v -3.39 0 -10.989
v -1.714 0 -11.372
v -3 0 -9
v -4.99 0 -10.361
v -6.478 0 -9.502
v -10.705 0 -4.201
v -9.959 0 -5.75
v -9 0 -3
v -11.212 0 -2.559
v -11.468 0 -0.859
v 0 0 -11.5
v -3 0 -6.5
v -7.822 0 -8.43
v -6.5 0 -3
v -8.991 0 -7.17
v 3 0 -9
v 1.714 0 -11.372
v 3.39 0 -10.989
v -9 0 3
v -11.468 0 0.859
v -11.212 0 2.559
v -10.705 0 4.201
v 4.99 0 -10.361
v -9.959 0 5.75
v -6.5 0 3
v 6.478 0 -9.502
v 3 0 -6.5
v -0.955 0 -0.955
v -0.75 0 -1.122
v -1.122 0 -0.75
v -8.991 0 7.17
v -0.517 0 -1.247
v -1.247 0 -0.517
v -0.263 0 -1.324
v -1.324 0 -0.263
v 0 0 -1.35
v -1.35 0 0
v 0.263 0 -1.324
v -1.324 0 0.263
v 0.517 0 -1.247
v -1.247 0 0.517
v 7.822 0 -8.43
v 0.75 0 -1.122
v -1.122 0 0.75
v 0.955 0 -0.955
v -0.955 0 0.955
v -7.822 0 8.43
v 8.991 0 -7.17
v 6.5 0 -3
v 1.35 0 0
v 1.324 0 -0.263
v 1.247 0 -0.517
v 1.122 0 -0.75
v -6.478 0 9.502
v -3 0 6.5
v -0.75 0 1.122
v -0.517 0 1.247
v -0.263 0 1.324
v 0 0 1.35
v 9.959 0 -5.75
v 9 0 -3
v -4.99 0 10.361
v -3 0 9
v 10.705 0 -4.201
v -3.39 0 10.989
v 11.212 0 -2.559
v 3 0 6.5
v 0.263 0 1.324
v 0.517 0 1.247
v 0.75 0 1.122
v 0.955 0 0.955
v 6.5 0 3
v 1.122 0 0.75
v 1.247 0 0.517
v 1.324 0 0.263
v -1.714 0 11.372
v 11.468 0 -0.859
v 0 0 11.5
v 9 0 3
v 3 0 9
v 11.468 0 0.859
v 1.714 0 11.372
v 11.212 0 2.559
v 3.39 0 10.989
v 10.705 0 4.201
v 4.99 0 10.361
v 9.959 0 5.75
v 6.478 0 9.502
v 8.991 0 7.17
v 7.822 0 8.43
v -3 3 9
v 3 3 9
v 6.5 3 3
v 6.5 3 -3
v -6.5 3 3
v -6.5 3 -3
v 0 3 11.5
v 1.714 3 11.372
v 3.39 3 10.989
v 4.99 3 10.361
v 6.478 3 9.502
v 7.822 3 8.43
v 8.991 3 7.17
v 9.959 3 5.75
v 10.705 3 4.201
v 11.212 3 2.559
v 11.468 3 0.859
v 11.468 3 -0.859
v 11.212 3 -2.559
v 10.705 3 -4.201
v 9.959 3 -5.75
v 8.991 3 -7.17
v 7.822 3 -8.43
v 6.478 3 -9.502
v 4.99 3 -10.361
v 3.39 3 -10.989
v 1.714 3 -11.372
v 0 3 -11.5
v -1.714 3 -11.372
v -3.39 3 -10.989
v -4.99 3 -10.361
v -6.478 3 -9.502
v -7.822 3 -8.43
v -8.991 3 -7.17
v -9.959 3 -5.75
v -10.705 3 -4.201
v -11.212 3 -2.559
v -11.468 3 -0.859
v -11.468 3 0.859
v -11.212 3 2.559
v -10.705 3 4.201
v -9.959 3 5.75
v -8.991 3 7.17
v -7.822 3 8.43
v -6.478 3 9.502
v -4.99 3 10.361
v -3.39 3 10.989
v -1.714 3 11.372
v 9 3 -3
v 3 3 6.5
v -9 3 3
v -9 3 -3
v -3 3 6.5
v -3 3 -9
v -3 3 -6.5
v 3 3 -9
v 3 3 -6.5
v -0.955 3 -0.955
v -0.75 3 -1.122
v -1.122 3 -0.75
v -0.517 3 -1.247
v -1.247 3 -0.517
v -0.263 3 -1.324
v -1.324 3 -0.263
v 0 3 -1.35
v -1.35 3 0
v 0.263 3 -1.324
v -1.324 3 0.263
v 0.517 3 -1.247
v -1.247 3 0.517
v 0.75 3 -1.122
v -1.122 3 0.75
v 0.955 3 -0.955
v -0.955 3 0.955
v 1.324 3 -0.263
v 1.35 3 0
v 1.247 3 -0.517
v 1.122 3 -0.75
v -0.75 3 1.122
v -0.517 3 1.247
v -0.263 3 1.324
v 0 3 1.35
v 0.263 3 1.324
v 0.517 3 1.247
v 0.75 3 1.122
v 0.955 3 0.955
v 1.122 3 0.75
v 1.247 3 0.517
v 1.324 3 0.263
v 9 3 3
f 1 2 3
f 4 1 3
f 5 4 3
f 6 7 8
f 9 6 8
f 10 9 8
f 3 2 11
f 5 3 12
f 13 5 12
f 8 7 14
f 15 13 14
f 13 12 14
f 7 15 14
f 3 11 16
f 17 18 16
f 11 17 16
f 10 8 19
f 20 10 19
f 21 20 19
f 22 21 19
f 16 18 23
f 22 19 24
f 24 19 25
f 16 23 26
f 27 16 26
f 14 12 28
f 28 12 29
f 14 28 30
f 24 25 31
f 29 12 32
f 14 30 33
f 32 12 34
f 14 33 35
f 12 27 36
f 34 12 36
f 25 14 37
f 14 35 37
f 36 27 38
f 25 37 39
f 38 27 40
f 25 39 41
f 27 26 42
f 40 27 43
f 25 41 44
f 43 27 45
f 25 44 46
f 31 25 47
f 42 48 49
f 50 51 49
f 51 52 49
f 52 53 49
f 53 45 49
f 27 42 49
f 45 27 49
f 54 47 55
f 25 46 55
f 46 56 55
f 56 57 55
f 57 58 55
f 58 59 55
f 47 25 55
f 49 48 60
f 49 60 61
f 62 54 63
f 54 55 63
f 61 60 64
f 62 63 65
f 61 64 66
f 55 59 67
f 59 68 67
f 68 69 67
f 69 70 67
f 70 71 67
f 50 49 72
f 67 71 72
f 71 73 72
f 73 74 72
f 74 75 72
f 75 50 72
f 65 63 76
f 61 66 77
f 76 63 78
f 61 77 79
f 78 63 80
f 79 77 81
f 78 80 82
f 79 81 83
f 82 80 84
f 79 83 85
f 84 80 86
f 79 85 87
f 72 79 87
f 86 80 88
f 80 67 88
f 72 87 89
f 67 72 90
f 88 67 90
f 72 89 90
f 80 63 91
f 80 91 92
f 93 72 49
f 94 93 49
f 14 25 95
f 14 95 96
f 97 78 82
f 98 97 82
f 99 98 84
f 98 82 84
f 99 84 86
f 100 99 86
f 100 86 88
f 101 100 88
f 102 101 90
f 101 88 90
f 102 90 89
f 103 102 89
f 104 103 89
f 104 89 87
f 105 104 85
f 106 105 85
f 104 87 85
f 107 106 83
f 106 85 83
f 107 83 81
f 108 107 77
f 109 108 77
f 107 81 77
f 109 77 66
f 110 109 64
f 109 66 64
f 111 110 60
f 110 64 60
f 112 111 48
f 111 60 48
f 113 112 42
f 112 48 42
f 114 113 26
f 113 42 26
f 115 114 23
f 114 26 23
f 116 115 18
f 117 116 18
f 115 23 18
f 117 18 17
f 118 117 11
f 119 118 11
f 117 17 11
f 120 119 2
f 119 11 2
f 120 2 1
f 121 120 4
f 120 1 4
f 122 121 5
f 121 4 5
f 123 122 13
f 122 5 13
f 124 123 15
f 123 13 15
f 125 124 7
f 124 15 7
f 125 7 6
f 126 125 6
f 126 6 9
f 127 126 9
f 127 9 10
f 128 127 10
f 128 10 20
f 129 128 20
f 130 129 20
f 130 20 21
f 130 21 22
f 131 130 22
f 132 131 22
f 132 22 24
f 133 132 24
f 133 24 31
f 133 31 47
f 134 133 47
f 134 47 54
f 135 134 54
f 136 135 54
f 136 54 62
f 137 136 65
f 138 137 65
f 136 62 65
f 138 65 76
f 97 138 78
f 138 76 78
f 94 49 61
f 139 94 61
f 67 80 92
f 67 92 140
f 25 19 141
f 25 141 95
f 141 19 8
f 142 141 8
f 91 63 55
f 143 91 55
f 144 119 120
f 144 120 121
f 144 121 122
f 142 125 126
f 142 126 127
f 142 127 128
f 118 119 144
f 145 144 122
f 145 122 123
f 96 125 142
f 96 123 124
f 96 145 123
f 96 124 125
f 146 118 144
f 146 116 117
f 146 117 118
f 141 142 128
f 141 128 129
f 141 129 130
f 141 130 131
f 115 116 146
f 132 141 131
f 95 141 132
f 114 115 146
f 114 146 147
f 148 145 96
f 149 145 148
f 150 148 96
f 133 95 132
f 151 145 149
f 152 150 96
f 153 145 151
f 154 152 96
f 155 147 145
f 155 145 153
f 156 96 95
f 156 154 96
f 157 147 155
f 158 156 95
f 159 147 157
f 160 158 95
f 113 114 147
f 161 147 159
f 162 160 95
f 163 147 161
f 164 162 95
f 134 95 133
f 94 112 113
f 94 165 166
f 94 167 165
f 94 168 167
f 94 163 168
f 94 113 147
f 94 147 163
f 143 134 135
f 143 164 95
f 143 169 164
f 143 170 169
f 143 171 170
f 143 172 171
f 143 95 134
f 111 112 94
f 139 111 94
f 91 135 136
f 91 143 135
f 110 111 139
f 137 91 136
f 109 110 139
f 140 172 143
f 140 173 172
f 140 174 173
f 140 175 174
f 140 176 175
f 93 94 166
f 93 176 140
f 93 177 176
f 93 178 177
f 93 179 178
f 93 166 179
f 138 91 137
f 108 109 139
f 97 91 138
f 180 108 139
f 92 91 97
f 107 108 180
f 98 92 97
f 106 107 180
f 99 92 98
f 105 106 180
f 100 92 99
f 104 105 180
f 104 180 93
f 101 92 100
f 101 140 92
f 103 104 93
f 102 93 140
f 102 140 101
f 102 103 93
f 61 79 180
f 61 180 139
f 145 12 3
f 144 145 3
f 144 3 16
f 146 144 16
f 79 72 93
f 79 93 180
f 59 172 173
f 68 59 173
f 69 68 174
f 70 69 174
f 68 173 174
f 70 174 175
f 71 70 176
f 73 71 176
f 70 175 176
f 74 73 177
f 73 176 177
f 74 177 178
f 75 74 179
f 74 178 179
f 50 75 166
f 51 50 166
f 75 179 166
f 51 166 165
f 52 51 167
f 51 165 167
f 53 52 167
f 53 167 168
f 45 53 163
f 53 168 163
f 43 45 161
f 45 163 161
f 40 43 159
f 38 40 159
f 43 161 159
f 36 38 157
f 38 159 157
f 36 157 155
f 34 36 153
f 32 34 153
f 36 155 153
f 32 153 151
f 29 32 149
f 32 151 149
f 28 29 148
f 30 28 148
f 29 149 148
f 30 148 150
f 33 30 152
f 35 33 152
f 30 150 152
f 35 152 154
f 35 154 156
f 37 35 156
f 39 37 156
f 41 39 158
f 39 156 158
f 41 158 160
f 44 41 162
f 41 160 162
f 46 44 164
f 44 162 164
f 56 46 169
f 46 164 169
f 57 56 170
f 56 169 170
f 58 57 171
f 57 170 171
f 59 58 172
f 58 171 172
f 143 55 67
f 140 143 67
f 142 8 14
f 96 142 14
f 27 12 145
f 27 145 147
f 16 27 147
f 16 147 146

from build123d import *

# Parameters (mm, degrees)
SKETCH5_R           = 11.5
BOSS_EXTRUDE2_DEPTH = 3
SKETCH3_W           = 6
SKETCH3_H           = 2.5
SKETCH3_W_2         = 2.5
SKETCH3_H_2         = 6
CUT_EXTRUDE1_DEPTH  = 3
SKETCH6_R           = 1.35
CUT_EXTRUDE2_DEPTH  = 3


with BuildPart() as part:
    # Sketch5 → Boss-Extrude2 (new body)
    with BuildSketch(Plane(origin=(0, 0, 0), x_dir=(1, 0, 0), z_dir=(0, 1, 0))):
        with Locations(Location((0, 0, 0), (0, 0, 270))):
            Circle(SKETCH5_R)
    extrude(amount=BOSS_EXTRUDE2_DEPTH)

    # Sketch3 → Cut-Extrude1 (cut)
    with BuildSketch(Plane(origin=(0, 0, 0), x_dir=(1, 0, 0), z_dir=(0, 1, 0))):
        with Locations((0, 7.75)):
            Rectangle(SKETCH3_W, SKETCH3_H)
        with Locations((7.75, 0)):
            Rectangle(SKETCH3_W_2, SKETCH3_H_2)
        with Locations((0, -7.75)):
            Rectangle(SKETCH3_W, SKETCH3_H)
        with Locations((-7.75, 0)):
            Rectangle(SKETCH3_W_2, SKETCH3_H_2)
    extrude(amount=CUT_EXTRUDE1_DEPTH, mode=Mode.SUBTRACT)

    # Sketch6 → Cut-Extrude2 (cut)
    with BuildSketch(Plane(origin=(0, 3, 0), x_dir=(1, 0, 0), z_dir=(0, 1, 0))):
        with Locations(Location((0, 0, 0), (0, 0, 270))):
            Circle(SKETCH6_R)
    extrude(amount=-CUT_EXTRUDE2_DEPTH, mode=Mode.SUBTRACT)


solid = part.part
